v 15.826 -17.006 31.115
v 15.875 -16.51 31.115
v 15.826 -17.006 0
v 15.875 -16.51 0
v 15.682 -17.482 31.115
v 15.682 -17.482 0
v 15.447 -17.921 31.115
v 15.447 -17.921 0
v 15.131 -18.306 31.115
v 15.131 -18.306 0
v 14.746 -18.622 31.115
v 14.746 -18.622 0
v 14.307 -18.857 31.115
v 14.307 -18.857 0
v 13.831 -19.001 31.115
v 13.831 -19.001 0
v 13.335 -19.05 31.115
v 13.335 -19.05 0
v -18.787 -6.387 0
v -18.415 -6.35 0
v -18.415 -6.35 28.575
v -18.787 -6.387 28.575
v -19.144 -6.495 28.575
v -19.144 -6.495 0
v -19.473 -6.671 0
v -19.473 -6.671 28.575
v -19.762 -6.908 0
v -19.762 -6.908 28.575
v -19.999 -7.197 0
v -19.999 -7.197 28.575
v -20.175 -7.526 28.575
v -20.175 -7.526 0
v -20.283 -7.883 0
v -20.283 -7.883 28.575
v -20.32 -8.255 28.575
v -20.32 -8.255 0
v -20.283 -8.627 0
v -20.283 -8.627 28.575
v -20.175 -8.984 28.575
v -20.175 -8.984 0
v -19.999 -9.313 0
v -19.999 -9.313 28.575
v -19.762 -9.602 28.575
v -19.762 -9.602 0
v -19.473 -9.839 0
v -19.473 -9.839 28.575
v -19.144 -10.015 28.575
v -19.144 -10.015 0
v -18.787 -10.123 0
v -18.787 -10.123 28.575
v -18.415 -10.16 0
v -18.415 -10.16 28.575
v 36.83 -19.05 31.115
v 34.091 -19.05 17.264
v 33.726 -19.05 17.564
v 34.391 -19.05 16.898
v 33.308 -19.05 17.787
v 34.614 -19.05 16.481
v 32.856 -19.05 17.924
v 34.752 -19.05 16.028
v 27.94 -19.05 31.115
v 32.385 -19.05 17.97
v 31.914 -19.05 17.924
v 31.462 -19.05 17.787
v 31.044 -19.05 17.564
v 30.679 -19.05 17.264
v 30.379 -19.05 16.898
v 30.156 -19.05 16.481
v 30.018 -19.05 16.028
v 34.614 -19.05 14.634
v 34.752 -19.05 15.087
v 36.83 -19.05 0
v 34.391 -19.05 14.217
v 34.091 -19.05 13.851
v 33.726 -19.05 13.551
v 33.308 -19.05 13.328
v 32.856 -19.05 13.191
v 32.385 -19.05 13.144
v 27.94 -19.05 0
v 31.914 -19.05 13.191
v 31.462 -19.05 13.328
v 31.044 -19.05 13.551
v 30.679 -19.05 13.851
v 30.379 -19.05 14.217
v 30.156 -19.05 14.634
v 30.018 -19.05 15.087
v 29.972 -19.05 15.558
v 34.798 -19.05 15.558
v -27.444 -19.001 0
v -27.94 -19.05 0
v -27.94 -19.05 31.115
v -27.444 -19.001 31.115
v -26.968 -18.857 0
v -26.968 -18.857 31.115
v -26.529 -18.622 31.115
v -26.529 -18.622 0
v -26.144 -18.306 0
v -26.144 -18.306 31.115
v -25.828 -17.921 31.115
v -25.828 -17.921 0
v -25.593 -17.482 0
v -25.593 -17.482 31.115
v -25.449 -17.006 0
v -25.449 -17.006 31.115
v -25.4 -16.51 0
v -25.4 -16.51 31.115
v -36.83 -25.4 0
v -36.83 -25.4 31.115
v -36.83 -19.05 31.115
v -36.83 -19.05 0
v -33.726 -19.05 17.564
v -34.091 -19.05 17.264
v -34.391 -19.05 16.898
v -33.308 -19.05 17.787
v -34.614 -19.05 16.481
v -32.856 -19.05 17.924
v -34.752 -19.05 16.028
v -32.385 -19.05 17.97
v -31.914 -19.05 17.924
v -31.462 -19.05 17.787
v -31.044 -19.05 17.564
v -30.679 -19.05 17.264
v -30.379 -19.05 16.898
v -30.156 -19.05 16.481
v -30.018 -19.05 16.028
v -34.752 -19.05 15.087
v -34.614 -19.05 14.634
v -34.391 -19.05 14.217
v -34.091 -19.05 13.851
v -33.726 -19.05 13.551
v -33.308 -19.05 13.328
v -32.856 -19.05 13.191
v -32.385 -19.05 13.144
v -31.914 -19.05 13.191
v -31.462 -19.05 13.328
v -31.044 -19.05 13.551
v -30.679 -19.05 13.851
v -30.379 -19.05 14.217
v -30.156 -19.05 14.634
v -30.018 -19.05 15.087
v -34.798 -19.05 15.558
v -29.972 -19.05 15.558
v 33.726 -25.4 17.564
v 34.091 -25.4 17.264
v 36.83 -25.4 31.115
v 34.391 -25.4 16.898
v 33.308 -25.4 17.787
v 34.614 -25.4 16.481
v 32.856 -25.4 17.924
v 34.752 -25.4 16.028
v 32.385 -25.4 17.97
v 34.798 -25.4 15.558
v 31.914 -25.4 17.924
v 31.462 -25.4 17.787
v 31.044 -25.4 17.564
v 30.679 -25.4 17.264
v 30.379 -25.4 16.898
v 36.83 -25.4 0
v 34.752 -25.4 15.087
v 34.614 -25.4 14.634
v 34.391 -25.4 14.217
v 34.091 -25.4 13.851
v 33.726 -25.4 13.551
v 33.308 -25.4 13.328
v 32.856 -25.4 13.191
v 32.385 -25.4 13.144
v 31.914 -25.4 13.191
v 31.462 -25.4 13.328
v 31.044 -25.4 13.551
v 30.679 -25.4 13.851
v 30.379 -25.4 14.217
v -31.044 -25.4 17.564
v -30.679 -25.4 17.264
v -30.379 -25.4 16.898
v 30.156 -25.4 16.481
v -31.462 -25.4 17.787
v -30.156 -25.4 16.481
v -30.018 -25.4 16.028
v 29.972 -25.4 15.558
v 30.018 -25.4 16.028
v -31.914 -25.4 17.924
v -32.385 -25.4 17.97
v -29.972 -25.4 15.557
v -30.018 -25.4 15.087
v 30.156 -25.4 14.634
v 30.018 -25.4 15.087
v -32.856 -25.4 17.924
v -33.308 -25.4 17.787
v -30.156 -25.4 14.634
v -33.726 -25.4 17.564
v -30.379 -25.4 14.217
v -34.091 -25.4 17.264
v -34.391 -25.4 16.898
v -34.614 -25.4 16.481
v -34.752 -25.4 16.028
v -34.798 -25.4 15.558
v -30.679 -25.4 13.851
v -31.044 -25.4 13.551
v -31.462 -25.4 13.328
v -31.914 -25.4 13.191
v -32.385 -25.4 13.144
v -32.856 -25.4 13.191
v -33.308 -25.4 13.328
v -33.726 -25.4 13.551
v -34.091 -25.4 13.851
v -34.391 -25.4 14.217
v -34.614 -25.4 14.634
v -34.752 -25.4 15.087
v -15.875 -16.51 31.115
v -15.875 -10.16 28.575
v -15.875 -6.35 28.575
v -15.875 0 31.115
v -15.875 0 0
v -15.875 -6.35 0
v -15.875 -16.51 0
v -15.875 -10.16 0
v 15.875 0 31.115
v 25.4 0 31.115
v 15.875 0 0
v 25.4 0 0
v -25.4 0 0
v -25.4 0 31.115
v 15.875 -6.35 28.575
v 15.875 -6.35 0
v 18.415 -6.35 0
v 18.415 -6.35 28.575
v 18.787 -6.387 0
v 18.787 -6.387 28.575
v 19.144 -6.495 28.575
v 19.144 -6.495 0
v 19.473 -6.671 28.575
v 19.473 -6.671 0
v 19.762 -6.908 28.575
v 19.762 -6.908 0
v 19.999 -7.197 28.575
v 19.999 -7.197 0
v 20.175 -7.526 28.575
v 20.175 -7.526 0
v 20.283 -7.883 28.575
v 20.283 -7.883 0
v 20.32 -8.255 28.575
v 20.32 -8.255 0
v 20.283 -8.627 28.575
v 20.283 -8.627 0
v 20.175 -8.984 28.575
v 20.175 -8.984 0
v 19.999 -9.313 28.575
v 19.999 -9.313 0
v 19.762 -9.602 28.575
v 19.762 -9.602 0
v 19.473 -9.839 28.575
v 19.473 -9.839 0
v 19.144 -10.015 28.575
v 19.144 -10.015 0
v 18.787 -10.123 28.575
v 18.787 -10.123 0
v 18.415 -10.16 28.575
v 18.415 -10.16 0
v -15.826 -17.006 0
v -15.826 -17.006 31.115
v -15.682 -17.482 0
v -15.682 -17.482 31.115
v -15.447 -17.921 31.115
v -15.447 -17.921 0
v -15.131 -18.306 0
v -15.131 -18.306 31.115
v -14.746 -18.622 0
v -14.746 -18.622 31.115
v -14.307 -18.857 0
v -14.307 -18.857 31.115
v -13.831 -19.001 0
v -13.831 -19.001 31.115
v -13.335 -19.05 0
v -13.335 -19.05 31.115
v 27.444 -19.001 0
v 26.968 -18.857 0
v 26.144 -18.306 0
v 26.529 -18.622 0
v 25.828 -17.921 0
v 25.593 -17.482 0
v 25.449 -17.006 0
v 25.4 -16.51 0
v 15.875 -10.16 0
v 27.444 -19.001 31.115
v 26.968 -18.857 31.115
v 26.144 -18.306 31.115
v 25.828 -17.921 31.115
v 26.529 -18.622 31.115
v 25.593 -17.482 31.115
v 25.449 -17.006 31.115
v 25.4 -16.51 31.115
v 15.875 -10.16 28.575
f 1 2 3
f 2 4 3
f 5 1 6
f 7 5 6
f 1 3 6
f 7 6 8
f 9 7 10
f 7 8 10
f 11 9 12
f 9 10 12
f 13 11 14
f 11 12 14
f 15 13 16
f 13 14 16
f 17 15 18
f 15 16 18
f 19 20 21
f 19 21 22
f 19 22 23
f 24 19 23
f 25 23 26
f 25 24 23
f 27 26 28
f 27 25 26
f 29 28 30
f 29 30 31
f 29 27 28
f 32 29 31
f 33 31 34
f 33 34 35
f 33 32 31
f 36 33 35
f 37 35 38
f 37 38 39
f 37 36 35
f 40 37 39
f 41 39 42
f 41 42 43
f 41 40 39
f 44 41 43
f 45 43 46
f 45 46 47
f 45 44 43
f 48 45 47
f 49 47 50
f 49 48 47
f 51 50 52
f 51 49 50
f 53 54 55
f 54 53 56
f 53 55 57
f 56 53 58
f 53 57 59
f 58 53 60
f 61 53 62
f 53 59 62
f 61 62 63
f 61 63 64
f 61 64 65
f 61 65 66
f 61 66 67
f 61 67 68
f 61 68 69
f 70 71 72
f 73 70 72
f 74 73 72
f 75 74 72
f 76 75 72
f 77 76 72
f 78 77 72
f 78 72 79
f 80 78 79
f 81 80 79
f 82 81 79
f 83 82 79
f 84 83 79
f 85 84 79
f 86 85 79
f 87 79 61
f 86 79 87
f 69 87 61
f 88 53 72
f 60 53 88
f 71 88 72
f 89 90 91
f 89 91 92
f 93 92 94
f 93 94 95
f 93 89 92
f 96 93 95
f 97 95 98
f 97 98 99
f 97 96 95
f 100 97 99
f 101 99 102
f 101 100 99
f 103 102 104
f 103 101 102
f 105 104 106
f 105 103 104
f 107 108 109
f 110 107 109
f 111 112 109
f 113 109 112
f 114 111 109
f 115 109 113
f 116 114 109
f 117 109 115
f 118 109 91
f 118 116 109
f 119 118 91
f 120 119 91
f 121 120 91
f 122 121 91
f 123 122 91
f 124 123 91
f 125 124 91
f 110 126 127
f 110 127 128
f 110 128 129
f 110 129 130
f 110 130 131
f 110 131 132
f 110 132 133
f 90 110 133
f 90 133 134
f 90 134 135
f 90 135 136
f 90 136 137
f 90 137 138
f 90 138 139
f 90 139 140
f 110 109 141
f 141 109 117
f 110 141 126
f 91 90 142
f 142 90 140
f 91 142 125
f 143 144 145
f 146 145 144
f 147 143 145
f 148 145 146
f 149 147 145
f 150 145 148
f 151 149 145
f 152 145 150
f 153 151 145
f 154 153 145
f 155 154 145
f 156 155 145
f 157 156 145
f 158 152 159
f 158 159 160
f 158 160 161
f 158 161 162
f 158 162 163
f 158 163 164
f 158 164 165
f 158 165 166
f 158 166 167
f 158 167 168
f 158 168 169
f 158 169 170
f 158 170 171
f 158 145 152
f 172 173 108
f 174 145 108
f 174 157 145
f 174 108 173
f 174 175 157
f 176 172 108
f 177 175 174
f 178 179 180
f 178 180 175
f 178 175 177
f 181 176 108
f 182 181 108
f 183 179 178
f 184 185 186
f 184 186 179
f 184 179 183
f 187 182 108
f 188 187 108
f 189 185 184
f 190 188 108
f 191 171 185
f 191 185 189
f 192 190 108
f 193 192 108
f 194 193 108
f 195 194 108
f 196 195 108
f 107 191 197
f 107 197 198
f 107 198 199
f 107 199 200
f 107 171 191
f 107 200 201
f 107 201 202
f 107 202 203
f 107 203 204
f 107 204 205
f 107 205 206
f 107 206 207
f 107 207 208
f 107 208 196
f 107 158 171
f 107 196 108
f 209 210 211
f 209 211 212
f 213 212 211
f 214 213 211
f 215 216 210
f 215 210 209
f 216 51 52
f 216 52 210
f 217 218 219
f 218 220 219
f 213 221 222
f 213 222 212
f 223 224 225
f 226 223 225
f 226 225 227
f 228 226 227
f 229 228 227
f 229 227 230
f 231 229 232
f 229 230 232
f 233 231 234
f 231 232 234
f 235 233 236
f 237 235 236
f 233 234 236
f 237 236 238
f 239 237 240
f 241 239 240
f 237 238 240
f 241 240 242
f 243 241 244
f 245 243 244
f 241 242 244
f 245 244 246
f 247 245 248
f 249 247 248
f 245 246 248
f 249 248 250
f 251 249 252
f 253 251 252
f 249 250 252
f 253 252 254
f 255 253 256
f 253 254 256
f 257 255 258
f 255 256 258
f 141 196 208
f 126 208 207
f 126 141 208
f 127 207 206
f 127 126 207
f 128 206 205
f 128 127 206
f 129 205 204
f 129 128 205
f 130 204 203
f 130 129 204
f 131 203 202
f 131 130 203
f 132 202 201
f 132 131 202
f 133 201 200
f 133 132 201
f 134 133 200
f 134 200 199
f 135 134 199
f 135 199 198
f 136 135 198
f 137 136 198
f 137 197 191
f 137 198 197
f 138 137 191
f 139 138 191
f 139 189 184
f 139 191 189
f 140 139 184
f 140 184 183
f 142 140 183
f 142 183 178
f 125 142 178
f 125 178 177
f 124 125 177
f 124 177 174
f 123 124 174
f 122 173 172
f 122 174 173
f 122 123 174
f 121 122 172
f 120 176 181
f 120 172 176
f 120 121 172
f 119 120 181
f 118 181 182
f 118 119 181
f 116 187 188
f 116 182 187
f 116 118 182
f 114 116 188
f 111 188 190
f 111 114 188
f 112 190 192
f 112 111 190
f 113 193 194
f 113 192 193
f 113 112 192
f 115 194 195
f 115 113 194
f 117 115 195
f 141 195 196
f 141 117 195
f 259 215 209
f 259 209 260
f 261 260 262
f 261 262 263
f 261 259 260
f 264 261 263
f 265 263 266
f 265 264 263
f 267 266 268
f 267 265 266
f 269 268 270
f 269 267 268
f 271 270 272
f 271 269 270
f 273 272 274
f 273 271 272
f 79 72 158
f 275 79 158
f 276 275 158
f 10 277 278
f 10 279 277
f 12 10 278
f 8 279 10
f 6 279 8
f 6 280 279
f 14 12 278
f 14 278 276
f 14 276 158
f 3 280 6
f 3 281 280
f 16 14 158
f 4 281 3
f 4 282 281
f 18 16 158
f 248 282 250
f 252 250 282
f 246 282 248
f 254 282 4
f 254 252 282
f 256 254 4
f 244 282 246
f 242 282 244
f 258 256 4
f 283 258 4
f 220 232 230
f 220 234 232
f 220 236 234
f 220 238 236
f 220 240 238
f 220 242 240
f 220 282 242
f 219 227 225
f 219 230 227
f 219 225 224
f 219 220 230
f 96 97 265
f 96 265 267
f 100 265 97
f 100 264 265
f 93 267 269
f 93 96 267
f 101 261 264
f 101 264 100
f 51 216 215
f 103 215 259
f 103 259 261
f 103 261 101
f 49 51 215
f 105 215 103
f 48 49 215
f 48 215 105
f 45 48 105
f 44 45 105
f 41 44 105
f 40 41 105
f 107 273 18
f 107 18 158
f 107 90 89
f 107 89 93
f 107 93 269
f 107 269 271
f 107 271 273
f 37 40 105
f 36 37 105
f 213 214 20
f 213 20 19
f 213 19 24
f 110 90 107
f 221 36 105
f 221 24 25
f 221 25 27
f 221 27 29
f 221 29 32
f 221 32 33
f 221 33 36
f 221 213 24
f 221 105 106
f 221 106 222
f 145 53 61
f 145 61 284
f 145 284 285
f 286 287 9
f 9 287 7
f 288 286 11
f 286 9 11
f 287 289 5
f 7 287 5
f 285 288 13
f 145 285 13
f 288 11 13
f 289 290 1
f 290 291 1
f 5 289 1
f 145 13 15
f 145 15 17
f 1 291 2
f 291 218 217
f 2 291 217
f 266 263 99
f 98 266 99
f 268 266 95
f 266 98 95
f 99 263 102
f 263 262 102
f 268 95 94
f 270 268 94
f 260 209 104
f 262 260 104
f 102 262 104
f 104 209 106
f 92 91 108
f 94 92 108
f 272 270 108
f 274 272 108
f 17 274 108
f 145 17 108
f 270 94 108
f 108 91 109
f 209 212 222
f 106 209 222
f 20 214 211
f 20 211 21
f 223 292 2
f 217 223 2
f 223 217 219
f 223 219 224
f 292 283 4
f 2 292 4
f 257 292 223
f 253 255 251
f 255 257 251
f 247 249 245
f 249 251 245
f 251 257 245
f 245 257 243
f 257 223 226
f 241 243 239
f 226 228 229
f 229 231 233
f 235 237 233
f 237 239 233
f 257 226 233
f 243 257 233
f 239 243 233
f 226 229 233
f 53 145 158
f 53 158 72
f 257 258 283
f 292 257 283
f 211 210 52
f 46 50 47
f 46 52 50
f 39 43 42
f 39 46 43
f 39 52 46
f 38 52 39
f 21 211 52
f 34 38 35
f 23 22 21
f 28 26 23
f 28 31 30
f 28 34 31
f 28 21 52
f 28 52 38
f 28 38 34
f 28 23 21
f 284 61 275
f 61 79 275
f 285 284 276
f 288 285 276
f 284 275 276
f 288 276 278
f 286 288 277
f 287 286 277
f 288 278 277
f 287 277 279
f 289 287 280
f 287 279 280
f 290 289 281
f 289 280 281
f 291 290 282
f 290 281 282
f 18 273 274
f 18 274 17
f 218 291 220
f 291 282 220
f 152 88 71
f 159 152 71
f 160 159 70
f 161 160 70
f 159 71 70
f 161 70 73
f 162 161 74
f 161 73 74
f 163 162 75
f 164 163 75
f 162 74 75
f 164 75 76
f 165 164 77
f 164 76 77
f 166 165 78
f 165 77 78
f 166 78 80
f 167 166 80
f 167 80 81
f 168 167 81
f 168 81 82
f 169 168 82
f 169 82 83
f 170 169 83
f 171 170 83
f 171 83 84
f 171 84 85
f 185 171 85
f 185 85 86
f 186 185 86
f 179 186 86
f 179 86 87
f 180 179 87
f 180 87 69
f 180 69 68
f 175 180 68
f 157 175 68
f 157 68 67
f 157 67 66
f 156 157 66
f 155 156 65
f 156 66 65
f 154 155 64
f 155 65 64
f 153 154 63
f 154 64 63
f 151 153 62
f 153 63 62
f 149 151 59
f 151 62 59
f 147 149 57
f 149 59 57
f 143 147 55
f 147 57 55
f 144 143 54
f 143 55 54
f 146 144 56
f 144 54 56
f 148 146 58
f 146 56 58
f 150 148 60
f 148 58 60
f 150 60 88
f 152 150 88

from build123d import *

# Parameters (mm, degrees)
BASE_DEPTH           = 28.575
BACK_PLATE_DEPTH     = 2.54
SKETCH4_R            = 2.413
MOUNTING_HOLES_DEPTH = 7.35


with BuildPart() as part:
    # Sketch2 → Base (new body)
    with BuildSketch(Plane.XY):
        with BuildLine():
            Line((13.335, -19.05), (0, -19.05))
            Line((0, -19.05), (0, -25.4))
            Line((0, -25.4), (36.83, -25.4))
            Line((36.83, -25.4), (36.83, -19.05))
            Line((36.83, -19.05), (27.94, -19.05))
            ThreePointArc((27.94, -19.05), (26.143948776, -18.306051224), (25.4, -16.51))
            Line((25.4, -16.51), (25.4, 0))
            Line((25.4, 0), (15.875, 0))
            Line((15.875, 0), (15.875, -6.35))
            Line((15.875, -6.35), (18.415, -6.35))
            ThreePointArc((18.415, -6.35), (20.32, -8.255), (18.415, -10.16))
            Line((18.415, -10.16), (15.875, -10.16))
            Line((15.875, -10.16), (15.875, -16.51))
            ThreePointArc((15.875, -16.51), (15.131051224, -18.306051224), (13.335, -19.05))
        make_face()
    base = extrude(amount=BASE_DEPTH)

    # Sketch5 → Back Plate (add)
    with BuildSketch(Plane.XY.offset(28.575)):
        with BuildLine():
            Line((0, -25.4), (36.83, -25.4))
            Line((36.83, -25.4), (36.83, -19.05))
            Line((36.83, -19.05), (27.94, -19.05))
            ThreePointArc((27.94, -19.05), (26.143948776, -18.306051224), (25.4, -16.51))
            Line((25.4, -16.51), (25.4, 0))
            Line((25.4, 0), (15.875, 0))
            Line((15.875, 0), (15.875, -6.35))
            Line((15.875, -6.35), (15.875, -10.16))
            Line((15.875, -10.16), (15.875, -16.51))
            ThreePointArc((15.875, -16.51), (15.131051224, -18.306051224), (13.335, -19.05))
            Line((13.335, -19.05), (0, -19.05))
            Line((0, -19.05), (0, -25.4))
        make_face()
    back_plate = extrude(amount=BACK_PLATE_DEPTH)

    # Sketch4 → Mounting Holes (cut, through all)
    with BuildSketch(Plane(origin=(0, -19.05, 0), x_dir=(1, 0, 0), z_dir=(0, 1, 0))):
        with Locations((32.385, -15.5575)):
            Circle(SKETCH4_R)
    mounting_holes = extrude(amount=-MOUNTING_HOLES_DEPTH, mode=Mode.SUBTRACT)

    # Mirror 2: Base, Back Plate, Mounting Holes across plane
    add(base.mirror(Plane(origin=(0, 0, 0), x_dir=(0, 0, 1), z_dir=(1, 0, 0))))
    add(back_plate.mirror(Plane(origin=(0, 0, 0), x_dir=(0, 0, 1), z_dir=(1, 0, 0))))
    add(mounting_holes.mirror(Plane(origin=(0, 0, 0), x_dir=(0, 0, 1), z_dir=(1, 0, 0))), mode=Mode.SUBTRACT)


solid = part.part
